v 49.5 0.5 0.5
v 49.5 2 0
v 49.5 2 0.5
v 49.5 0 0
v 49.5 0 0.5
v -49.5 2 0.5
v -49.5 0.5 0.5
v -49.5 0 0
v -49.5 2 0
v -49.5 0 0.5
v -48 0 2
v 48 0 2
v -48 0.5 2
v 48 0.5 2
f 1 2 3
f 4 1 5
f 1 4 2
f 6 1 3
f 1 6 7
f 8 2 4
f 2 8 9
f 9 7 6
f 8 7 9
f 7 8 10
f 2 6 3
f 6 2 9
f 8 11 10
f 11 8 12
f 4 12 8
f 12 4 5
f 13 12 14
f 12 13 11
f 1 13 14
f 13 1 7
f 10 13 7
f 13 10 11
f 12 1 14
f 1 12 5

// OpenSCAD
module lprofile(length=100, width=2, thickness=0.5, angle45=true) 
{
    cut_depth = angle45 ? (width-thickness) : 0;
    l = angle45 ? (length-2*thickness) : length;

    color([0.9,0.3,0.3])
    translate([0,width/2,thickness/2])
    cube([l, width, thickness], center=true);
    
    color([0.9,0.3,0.3])
    translate([-l/2,thickness,0])
    rotate([90,0,0])
    linear_extrude(thickness) 
    polygon(points=[[0, 0],[0,thickness],[cut_depth,width],
        [l-cut_depth,width],[l,thickness],[l,0],
        [0,0]]);
}

lprofile();
